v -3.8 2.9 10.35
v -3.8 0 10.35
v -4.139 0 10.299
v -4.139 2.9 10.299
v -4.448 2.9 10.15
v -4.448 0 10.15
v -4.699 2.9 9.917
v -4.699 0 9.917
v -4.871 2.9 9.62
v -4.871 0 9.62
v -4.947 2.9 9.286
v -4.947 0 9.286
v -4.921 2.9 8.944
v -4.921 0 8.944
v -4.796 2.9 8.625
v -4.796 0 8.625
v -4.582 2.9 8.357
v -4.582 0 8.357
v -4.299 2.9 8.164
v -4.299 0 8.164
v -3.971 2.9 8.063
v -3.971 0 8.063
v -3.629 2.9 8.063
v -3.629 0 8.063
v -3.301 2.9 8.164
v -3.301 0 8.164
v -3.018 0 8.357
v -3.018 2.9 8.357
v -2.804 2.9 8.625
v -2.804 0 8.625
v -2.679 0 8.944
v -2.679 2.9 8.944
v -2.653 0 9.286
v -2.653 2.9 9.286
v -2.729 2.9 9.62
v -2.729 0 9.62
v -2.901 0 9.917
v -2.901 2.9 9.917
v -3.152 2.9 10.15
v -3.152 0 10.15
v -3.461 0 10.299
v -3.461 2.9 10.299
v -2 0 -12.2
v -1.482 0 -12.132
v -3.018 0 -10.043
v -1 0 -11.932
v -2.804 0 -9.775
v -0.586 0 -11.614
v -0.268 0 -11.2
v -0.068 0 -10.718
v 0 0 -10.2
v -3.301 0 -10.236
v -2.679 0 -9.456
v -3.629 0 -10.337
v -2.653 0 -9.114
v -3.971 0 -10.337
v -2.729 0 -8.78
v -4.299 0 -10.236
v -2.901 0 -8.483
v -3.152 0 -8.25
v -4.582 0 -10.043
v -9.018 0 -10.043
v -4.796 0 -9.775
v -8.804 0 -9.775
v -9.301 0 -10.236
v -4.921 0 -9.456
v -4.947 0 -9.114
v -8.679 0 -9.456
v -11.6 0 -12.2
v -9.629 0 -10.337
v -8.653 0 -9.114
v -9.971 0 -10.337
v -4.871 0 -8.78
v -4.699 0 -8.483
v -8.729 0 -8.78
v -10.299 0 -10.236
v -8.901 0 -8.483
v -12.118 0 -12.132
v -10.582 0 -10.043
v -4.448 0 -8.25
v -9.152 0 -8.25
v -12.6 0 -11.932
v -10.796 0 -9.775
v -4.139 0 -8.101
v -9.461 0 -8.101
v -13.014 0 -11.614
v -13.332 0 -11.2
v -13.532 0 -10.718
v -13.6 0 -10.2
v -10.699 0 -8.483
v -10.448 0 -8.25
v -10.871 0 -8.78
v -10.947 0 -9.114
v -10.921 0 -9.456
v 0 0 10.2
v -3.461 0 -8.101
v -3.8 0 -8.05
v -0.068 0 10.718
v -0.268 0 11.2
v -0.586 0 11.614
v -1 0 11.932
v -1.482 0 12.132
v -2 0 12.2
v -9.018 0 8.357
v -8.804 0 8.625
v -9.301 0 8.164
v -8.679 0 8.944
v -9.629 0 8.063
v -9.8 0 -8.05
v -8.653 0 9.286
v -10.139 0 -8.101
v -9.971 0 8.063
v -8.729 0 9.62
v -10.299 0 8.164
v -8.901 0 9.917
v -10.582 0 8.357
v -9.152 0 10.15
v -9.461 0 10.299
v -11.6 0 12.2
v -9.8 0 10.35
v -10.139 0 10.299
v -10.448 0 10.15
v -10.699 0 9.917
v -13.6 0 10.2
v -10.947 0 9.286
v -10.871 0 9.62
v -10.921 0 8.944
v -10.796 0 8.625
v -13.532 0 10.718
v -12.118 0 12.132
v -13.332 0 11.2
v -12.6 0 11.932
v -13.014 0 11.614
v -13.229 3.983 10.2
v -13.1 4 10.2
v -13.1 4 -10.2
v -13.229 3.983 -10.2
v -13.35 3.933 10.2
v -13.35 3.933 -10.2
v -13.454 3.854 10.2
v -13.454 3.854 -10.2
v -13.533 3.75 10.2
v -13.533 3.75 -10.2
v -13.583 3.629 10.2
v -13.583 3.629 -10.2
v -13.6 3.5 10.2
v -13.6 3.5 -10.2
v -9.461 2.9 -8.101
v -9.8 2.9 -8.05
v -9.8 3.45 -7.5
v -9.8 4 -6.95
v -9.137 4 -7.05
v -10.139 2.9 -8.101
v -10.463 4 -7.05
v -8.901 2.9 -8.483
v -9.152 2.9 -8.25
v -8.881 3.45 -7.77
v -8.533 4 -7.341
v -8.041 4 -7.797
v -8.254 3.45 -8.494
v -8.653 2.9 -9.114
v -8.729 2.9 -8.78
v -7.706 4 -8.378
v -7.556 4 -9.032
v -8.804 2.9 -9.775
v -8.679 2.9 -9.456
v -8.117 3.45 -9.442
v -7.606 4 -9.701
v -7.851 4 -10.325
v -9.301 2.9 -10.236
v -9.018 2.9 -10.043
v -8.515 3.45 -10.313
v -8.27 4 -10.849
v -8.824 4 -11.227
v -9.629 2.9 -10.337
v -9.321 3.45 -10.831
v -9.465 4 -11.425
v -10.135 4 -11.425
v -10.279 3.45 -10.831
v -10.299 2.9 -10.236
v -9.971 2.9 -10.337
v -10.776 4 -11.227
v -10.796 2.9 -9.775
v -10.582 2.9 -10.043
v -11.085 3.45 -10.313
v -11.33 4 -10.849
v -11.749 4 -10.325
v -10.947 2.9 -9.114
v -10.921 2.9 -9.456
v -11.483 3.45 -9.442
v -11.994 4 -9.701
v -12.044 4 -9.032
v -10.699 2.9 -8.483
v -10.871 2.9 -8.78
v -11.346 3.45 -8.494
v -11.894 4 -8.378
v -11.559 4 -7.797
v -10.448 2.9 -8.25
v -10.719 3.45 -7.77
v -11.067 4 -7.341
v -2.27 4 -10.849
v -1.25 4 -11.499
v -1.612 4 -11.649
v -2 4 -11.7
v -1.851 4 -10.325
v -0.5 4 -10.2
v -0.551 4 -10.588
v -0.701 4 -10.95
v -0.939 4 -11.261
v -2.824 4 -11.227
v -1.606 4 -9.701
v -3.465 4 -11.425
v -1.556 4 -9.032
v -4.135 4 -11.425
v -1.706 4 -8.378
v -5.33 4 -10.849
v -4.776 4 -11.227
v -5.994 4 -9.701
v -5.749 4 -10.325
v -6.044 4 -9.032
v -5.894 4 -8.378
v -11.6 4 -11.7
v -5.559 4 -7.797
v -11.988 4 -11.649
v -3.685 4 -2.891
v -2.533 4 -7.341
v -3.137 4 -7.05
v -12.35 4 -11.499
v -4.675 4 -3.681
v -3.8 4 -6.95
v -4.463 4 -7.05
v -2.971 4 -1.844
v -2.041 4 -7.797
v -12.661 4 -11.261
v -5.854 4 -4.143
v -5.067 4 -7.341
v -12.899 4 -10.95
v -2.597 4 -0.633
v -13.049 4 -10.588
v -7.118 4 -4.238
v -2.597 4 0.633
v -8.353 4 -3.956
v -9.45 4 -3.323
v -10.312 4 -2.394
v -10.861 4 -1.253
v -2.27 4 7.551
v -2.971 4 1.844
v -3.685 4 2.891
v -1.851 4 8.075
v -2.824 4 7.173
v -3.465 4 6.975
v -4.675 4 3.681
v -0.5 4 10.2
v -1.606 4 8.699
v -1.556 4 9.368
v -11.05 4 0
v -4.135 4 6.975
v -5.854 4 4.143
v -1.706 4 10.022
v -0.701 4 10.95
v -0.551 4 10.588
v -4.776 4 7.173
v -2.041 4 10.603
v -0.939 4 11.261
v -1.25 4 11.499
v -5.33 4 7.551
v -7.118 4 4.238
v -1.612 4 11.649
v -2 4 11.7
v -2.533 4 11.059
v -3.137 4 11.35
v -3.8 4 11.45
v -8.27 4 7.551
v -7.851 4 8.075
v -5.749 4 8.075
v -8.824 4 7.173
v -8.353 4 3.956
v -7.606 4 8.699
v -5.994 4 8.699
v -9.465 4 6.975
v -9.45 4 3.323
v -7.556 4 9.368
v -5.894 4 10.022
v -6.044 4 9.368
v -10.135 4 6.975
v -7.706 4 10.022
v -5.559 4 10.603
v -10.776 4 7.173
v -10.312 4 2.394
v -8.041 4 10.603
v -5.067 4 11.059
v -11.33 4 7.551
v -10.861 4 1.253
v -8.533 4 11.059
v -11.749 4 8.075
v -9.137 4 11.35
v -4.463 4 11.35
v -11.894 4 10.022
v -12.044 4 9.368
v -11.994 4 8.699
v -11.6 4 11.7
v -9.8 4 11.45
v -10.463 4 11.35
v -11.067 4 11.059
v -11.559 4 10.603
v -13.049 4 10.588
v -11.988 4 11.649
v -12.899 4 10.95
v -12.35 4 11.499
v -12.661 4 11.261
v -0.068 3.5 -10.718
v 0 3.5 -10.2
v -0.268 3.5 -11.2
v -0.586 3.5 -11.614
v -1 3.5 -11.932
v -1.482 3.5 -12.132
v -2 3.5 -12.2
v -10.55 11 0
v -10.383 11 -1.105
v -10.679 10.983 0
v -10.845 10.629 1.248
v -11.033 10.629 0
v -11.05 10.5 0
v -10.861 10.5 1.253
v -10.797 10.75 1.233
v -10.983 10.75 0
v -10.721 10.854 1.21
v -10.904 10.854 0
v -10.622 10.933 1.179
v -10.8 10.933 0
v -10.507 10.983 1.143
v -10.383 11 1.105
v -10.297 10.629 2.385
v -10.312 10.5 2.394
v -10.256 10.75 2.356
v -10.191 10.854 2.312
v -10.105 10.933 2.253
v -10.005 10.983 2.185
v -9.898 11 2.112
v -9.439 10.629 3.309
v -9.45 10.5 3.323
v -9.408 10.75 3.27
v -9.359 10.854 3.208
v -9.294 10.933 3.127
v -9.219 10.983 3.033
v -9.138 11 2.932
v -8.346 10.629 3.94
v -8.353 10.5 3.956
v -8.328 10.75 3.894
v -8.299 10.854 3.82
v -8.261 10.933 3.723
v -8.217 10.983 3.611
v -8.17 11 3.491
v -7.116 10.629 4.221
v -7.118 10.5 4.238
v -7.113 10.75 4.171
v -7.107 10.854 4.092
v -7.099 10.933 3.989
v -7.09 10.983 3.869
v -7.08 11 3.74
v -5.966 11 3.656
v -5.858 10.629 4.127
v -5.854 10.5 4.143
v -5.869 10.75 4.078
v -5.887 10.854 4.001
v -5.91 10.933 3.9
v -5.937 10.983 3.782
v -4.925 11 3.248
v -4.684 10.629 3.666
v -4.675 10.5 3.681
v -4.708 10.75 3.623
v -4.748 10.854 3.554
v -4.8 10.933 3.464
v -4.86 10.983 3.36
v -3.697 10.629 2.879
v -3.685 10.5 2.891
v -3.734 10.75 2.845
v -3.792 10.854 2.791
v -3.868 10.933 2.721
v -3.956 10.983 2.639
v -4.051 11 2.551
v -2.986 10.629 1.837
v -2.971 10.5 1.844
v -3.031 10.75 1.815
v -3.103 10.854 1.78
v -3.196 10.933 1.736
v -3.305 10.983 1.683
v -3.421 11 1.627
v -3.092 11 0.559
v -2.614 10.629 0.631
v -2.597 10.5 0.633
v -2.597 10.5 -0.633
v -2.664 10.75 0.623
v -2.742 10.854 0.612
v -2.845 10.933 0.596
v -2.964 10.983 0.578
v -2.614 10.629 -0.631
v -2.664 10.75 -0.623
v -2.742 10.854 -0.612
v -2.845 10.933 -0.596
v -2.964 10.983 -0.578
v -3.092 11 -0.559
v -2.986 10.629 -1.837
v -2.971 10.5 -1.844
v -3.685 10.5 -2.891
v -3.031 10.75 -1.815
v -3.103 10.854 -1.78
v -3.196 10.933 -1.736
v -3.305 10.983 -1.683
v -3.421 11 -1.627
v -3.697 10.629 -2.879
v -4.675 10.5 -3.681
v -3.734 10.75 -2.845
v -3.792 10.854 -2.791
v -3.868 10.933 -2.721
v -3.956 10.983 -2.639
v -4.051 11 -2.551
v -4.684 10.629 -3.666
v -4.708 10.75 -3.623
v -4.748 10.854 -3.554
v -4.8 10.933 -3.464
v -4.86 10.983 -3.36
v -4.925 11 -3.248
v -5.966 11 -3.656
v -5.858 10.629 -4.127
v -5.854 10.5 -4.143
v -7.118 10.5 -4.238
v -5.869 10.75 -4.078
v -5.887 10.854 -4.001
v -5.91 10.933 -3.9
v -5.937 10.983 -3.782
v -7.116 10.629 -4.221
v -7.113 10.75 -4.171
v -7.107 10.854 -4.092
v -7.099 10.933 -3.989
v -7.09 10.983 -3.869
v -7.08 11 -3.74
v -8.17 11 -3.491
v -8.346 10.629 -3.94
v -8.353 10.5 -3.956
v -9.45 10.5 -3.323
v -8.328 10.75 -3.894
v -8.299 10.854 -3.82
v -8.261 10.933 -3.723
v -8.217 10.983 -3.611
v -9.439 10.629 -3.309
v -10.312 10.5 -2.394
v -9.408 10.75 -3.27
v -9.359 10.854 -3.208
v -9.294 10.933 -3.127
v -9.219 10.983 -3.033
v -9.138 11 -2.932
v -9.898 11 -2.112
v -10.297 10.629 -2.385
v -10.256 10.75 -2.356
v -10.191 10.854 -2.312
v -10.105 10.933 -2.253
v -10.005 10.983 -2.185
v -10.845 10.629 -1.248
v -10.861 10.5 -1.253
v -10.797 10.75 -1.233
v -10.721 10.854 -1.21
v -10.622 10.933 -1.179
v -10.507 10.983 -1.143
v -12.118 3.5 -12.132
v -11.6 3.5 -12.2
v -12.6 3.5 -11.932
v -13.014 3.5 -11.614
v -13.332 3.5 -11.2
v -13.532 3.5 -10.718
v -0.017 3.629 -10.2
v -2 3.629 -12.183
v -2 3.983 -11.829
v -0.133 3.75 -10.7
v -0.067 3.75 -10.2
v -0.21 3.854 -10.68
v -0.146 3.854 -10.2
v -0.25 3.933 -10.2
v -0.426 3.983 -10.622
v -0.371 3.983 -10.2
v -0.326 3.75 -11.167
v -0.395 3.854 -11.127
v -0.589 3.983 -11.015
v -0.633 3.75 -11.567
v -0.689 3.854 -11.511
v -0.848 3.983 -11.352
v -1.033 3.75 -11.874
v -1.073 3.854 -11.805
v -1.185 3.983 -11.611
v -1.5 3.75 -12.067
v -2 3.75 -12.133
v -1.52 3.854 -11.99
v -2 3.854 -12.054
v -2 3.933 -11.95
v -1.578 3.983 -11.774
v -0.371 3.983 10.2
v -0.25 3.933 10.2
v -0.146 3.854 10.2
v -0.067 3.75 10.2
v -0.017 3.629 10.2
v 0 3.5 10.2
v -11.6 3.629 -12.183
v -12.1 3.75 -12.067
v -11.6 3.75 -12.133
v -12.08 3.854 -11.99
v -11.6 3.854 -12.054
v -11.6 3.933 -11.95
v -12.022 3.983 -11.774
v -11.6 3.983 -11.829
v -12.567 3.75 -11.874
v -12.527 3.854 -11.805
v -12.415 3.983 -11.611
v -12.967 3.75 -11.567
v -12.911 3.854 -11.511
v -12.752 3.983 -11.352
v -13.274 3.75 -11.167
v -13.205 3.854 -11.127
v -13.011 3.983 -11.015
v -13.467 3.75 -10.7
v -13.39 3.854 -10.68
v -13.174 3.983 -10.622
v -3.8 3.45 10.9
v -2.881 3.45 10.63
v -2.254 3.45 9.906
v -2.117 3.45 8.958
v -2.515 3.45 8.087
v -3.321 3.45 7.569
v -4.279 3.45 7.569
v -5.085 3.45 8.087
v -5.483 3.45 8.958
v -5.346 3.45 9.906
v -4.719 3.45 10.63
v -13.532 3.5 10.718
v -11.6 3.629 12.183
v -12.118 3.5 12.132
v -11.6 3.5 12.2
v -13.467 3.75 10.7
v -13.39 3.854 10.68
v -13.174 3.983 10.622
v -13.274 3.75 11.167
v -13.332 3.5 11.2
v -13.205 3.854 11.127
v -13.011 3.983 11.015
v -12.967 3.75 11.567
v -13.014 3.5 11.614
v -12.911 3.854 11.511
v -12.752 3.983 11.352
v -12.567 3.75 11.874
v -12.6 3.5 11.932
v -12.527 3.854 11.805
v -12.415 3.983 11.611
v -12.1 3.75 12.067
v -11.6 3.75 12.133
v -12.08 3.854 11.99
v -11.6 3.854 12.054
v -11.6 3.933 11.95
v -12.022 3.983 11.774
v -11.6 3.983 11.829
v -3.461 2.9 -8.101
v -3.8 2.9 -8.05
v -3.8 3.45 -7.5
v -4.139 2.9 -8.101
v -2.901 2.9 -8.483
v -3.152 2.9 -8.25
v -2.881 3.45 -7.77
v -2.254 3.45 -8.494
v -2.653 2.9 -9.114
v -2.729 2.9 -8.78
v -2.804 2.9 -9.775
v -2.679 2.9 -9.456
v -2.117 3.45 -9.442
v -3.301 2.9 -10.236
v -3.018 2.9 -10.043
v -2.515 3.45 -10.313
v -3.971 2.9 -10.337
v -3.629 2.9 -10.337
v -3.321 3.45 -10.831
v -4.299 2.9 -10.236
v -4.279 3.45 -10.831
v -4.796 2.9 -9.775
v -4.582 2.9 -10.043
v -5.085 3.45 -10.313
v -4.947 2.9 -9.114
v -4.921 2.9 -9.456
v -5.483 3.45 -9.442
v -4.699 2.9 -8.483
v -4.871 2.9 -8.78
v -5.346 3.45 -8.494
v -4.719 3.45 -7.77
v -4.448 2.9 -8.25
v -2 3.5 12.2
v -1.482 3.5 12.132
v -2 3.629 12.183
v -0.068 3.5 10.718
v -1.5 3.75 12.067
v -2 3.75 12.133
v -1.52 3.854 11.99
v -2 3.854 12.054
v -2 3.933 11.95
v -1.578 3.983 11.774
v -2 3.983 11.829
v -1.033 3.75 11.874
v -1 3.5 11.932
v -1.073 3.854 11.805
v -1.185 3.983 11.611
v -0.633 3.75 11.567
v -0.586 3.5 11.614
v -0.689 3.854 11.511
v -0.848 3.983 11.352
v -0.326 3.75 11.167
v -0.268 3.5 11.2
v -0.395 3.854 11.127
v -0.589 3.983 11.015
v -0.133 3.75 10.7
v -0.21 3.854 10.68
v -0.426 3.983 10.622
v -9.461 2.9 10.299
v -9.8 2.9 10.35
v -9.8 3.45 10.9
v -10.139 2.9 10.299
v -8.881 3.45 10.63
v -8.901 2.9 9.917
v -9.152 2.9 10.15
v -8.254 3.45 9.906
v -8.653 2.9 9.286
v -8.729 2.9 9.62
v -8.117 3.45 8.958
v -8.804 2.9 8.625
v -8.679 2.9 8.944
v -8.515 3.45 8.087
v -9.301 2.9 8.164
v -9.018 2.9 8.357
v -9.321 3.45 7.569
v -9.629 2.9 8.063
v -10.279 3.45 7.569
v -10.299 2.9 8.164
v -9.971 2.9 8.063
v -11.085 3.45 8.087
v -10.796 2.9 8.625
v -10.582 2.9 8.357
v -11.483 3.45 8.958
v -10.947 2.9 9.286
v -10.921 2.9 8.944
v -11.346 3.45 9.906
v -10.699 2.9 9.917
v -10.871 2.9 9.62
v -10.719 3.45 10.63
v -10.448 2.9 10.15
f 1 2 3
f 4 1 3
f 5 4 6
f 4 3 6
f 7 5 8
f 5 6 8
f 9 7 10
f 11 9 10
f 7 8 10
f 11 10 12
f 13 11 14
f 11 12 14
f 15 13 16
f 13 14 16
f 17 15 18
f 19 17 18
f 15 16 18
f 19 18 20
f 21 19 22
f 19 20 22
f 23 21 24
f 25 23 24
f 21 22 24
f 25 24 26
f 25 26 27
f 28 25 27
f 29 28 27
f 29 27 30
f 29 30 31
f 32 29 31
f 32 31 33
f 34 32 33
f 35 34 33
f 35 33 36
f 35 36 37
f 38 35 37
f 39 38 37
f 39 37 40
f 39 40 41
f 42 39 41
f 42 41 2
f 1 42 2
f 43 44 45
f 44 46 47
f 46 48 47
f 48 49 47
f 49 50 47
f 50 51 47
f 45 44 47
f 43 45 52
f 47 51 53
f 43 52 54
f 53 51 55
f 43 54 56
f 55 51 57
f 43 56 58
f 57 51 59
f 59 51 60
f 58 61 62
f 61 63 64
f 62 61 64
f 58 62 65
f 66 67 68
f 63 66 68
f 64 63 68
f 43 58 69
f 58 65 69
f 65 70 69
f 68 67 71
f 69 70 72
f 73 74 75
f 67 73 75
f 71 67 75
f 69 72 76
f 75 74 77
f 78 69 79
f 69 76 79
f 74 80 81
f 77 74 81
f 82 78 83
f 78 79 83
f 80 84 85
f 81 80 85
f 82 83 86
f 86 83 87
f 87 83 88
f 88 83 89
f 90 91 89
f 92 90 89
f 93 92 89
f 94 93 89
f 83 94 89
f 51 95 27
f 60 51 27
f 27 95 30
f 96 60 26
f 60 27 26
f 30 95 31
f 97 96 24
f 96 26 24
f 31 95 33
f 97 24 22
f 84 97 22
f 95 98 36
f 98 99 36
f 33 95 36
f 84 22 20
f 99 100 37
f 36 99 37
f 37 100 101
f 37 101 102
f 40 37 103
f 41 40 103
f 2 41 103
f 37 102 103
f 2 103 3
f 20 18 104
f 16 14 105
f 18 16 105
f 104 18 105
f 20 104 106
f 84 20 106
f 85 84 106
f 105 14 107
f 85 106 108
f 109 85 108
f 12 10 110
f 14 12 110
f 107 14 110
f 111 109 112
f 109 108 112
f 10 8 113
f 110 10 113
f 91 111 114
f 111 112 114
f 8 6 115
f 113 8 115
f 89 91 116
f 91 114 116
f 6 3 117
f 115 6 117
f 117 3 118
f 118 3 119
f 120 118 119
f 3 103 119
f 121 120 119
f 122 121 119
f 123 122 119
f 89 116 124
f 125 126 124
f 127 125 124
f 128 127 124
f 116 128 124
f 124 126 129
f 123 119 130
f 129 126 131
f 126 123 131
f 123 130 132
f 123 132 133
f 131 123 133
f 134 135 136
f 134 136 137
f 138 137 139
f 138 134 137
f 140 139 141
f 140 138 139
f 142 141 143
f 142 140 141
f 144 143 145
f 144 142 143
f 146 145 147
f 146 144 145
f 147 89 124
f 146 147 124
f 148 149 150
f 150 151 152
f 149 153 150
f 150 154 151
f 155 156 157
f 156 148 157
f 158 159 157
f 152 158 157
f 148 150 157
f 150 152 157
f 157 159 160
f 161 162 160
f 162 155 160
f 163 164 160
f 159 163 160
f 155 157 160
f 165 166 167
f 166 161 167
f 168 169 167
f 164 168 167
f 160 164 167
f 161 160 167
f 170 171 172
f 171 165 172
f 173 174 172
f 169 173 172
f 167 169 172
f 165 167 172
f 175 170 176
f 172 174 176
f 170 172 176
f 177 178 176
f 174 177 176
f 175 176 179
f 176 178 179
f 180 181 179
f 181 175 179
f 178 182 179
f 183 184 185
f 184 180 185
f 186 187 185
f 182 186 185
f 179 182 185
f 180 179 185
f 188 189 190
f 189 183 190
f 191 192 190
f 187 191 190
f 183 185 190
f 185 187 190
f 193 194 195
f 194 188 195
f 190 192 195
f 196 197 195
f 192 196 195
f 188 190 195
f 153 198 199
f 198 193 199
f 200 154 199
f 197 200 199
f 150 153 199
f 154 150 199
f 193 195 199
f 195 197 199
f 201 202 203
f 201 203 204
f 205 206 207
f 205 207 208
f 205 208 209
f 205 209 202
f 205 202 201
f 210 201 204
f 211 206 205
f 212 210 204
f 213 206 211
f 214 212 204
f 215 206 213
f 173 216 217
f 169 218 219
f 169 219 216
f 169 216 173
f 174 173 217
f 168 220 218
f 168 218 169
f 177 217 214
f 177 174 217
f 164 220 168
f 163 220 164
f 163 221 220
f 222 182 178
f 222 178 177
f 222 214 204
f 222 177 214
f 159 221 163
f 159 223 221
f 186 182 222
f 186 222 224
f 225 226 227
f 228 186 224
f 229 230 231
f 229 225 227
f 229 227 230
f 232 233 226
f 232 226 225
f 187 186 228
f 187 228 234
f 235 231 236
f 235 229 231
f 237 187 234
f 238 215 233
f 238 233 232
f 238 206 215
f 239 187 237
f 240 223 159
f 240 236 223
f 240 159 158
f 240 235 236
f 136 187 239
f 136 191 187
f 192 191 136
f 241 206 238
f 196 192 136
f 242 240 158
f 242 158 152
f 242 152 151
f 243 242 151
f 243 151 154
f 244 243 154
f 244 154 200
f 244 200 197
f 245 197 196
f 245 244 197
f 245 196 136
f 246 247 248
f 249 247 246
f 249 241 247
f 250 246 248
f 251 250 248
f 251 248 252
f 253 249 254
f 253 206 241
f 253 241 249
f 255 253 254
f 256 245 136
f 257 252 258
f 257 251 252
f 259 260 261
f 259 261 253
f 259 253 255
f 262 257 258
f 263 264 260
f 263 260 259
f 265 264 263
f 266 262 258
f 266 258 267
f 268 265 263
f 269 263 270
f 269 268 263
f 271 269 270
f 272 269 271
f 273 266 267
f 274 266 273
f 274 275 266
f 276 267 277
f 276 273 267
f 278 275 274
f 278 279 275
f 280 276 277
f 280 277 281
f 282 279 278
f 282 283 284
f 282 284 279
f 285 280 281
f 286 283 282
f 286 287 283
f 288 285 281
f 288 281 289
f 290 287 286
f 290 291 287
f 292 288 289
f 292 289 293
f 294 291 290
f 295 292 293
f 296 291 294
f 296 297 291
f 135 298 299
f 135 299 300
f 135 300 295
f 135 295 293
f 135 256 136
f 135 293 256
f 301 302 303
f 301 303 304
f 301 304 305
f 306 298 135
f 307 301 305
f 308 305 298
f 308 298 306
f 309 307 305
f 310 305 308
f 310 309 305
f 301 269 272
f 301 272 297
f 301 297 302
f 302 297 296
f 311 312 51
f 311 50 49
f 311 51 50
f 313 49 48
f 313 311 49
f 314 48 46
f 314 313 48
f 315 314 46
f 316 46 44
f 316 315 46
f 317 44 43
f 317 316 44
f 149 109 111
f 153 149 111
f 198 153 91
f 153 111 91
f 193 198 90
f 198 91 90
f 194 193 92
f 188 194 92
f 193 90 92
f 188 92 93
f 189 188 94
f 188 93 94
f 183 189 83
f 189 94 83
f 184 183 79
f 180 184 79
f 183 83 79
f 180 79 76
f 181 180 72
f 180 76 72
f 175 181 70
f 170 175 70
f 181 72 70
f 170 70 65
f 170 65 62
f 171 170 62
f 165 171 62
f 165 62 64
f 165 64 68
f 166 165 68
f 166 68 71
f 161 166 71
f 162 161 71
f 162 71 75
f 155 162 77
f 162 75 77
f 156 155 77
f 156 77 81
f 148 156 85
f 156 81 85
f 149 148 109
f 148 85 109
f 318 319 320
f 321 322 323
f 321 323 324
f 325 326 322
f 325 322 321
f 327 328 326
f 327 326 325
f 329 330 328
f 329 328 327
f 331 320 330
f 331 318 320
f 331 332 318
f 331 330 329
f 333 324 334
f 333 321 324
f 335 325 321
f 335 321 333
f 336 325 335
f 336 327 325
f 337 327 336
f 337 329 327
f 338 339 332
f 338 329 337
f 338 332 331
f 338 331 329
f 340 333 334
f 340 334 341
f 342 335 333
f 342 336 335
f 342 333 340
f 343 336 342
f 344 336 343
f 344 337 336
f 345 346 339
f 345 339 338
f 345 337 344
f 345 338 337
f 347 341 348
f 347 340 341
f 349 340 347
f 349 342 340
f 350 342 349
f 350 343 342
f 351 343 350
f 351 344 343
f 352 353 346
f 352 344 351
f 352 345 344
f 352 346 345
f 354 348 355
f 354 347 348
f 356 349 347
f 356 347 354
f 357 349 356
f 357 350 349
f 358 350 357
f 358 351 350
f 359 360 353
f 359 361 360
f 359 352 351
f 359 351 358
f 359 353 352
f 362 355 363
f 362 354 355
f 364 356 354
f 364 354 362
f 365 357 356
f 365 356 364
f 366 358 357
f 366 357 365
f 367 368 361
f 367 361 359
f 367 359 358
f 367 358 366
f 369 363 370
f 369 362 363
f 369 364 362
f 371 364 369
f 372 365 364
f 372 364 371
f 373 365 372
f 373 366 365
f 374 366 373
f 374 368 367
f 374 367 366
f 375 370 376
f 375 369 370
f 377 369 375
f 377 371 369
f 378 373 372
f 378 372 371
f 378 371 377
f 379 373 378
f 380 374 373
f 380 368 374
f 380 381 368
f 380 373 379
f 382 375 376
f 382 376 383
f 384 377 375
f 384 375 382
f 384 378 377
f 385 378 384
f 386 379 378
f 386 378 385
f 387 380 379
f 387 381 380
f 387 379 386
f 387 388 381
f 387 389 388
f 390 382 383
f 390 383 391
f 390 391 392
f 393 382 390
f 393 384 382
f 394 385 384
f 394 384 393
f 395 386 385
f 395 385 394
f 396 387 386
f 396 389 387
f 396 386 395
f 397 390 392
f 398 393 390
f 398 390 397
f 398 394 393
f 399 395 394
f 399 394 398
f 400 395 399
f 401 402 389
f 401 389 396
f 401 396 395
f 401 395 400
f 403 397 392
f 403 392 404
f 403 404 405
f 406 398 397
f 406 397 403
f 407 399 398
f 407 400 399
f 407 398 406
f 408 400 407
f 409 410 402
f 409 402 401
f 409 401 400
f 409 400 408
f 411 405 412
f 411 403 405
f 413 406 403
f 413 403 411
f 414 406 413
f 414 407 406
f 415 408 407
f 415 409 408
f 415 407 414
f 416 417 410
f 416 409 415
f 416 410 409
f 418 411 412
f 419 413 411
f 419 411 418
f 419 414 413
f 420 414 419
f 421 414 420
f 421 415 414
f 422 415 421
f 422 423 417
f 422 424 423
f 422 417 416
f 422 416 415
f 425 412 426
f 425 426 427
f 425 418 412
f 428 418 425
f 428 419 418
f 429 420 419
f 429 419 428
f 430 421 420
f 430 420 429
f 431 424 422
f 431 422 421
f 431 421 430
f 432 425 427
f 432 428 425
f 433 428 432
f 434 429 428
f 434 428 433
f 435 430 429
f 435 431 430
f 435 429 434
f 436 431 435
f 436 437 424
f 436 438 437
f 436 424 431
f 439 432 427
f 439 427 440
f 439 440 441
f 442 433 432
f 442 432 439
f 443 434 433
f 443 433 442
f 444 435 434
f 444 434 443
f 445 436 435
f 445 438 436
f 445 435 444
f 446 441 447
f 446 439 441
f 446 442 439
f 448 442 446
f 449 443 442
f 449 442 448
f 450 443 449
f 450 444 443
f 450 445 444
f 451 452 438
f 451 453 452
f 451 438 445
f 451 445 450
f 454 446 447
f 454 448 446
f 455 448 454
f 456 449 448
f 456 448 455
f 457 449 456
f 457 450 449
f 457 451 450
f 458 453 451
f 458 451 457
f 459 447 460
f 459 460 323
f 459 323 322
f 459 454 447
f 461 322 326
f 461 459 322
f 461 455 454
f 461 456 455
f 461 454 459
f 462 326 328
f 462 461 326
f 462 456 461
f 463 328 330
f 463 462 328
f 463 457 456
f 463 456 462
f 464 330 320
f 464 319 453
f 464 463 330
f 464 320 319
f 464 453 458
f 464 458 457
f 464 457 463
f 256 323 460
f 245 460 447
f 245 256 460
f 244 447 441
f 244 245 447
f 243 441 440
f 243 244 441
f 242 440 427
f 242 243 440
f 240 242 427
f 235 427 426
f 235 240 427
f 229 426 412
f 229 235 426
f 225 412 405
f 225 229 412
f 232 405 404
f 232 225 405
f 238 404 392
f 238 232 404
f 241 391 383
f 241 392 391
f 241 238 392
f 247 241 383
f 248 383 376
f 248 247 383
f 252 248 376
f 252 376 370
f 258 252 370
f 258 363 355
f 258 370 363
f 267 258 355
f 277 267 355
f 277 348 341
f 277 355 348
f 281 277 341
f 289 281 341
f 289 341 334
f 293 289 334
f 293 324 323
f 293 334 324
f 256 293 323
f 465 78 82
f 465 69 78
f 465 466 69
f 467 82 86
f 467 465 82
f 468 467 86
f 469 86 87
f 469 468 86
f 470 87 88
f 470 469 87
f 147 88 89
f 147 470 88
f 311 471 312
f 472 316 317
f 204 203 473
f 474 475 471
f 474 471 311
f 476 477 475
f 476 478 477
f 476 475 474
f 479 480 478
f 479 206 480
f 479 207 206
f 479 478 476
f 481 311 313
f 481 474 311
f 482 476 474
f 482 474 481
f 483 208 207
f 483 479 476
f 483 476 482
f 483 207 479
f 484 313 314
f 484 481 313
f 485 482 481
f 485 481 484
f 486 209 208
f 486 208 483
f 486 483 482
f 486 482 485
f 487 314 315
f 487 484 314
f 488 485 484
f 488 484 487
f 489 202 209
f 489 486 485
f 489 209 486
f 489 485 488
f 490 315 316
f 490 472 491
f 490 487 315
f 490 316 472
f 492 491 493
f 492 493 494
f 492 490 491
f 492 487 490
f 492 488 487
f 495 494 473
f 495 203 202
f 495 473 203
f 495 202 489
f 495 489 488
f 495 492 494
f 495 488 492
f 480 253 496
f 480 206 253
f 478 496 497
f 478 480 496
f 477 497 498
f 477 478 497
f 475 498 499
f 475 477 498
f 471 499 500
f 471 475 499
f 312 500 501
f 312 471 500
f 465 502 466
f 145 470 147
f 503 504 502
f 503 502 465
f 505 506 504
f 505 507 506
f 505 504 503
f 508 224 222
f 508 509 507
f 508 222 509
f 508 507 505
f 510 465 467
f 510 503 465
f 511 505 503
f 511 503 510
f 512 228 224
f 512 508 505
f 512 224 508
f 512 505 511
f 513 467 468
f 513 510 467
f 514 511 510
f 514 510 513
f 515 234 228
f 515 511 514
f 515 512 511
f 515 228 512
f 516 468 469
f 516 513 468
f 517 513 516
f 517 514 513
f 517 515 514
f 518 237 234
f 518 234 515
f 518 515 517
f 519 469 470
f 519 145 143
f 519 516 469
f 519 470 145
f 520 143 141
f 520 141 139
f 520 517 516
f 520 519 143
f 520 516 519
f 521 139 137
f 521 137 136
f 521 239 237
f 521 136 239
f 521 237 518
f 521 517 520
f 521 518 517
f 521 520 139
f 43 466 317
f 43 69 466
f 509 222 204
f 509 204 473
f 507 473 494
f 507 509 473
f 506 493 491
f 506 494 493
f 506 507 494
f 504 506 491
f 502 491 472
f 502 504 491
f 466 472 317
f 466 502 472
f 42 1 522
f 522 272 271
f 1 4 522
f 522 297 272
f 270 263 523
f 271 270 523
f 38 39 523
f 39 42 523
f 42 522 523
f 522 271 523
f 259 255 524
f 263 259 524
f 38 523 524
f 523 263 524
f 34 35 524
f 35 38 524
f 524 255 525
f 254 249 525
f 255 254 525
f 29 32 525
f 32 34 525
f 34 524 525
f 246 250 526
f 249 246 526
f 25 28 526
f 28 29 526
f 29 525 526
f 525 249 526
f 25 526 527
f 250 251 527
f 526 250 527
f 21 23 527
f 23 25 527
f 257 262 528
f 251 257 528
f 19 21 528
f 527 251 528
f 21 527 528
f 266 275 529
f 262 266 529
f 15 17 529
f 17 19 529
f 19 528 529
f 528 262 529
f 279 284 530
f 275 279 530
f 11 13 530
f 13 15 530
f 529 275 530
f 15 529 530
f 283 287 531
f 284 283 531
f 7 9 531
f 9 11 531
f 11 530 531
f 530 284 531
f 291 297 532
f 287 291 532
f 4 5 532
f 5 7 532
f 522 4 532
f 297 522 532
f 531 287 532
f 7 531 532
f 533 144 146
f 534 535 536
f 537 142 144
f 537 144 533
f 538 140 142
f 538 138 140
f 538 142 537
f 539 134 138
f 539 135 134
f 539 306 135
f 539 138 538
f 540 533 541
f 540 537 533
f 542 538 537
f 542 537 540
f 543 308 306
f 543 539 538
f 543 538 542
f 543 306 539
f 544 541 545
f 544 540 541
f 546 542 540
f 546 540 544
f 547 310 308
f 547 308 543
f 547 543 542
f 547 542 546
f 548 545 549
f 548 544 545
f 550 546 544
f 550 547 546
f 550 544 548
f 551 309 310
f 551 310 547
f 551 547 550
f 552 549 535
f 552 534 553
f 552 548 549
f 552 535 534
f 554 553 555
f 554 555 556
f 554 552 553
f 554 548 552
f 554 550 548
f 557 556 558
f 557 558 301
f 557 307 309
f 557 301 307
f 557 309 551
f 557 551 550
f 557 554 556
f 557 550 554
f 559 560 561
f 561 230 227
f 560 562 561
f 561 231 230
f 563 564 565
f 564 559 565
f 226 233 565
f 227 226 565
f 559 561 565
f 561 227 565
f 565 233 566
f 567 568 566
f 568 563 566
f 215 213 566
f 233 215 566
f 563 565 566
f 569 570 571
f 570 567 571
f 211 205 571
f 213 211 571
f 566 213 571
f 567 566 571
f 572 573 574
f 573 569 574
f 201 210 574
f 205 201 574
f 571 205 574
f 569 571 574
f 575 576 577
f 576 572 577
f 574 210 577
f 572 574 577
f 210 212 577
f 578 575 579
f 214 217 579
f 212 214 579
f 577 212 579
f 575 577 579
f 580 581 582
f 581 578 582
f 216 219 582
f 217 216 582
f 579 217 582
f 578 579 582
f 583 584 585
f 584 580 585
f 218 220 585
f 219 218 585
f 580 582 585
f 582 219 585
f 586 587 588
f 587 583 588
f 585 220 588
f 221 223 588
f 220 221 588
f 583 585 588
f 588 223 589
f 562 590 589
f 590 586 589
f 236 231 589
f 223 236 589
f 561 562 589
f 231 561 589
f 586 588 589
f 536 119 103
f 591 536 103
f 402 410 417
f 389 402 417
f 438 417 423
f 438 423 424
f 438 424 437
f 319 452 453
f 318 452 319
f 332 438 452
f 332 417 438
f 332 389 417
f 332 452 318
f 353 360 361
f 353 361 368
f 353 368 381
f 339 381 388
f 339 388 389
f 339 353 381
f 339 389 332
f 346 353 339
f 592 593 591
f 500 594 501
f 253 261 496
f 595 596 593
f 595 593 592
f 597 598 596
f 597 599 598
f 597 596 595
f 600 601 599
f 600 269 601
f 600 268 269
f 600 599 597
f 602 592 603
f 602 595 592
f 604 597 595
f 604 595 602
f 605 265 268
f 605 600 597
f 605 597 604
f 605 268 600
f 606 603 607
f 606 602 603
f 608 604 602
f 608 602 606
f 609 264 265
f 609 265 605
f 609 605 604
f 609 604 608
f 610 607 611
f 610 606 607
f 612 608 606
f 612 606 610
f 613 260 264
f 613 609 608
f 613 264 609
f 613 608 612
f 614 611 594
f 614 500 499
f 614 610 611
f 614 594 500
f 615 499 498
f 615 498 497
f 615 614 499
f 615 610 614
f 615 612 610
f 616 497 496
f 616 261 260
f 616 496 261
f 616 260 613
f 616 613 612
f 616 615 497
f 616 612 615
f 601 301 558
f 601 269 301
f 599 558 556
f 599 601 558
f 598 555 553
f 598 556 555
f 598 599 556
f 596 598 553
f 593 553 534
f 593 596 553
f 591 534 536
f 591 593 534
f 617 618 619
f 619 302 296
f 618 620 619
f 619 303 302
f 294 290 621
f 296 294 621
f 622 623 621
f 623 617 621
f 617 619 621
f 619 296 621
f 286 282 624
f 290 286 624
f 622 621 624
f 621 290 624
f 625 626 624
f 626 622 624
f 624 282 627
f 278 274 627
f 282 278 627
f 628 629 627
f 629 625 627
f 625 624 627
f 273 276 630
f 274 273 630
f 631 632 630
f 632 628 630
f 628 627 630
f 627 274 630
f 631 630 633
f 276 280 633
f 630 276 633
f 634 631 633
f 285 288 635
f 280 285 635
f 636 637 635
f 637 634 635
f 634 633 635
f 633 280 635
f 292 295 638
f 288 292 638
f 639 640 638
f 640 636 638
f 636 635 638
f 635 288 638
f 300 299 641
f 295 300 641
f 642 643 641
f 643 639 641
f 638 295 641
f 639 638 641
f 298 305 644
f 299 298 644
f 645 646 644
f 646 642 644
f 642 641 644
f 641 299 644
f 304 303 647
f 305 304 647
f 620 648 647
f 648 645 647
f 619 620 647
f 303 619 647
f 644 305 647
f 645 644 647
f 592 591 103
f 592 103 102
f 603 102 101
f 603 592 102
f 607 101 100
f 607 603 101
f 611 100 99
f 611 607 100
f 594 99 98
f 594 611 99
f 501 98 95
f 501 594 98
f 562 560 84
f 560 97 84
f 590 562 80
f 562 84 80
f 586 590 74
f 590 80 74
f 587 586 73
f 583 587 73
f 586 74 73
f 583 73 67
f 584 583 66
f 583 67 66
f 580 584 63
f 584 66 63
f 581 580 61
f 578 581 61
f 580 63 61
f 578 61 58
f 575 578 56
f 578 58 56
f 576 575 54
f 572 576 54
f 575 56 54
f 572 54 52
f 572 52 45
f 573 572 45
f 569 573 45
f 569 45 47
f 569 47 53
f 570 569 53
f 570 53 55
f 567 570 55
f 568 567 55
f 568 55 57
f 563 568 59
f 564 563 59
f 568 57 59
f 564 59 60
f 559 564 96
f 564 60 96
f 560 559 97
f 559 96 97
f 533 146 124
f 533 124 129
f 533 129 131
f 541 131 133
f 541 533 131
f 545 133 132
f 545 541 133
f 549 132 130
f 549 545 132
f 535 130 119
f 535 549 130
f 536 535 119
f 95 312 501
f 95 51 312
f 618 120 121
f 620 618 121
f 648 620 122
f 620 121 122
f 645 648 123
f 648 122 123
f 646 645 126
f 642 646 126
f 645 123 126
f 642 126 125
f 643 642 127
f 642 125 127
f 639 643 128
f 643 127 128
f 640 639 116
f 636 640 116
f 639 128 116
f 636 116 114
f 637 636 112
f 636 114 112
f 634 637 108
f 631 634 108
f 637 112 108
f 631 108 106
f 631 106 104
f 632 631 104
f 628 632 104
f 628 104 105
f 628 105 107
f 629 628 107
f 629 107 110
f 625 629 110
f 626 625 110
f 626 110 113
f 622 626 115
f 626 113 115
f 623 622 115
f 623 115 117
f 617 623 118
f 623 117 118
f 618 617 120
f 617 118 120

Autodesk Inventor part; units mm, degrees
ref_plane "YZ Plane" through (0, 0, 0) normal (1, 0, 0) x (0, 1, 0)
ref_plane "XZ Plane" through (0, 0, 0) normal (0, 1, 0) x (-1, 0, 0)
ref_plane "XY Plane" through (0, 0, 0) normal (0, 0, 1) x (1, 0, 0)
sketch "Sketch1" plane through (0, 0, 0) normal (0, 1, 0) x (-1, 0, 0)
  line L0 (0, -21.955) -> (0, -12.2) construction
  line L1 (13.6, -21.955) -> (13.6, -12.2) construction
  line L2 (-11, -20.9069) -> (-11, 21.1673) construction
  line L3 (16.0254, 0) -> (-21.0399, 0) construction
  line L4 (13.6, -6.2) -> (0, -6.2)
  line L5 (13.6, 6.2) -> (0, 6.2)
  line L6 (6.8, -14.862) -> (6.8, 12.9569) construction
  line L7 (13.6, -6.2) -> (13.6, 6.2)
  line L8 (13.6, 6.2) -> (13.6, 12.2)
  line L9 (0, -6.2) -> (0, 6.2)
  line L10 (0, 6.2) -> (0, 12.2)
  line L11 (13.6, -12.2) -> (0, -12.2)
  line L12 (13.6, 12.2) -> (0, 12.2)
  line L13 (13.6, -12.2) -> (13.6, -6.2)
  line L14 (0, -12.2) -> (0, -6.2)
  line L15 (13.6, 12.2) -> (13.6, 20.1192) construction
  line L16 (0, 12.2) -> (0, 20.7166) construction
  line L17 (9.8, -9.2) -> (3.8, -9.2) construction
  line L18 (3.8, -9.2) -> (3.8, 9.2) construction
  line L19 (3.8, 9.2) -> (9.8, 9.2) construction
  line L20 (9.8, 9.2) -> (9.8, -9.2) construction
  circle A0 centre (6.8, 0) radius 4.25
  point P0 (0, 0)
  dimension "d0" = 24.6
  dimension "d1" = 12.4
  dimension "d2" = 6
  dimension "d4" = 6
  dimension "d17" = 8.5
  dimension "d21" = 6.8
extrude "Extrusion1" add sketch "Sketch1" along normal blind 4 contours L13 L11 L14 L4 | L5 L10 L12 L8
extrude "Extrusion2" add sketch "Sketch1" along normal blind 4 contours L4 L9 L5 L7 | A0
fillet "Fillet1" radius 2 4 edges at (0, 2, 12.2) (-13.6, 2, 12.2) (-13.6, 2, -12.2) (0, 2, -12.2)
extrude "Extrusion3" add sketch "Sketch1" along normal blind 11 contours A0
fillet "Fillet2" radius 0.5 9 edges at (-2.55, 11, 0) (0, 4, 0) (-13.6, 4, 0) (-0.5858, 4, -11.6142) (-6.8, 4, -12.2) (-13.0142, 4, -11.6142) (-0.5858, 4, 11.6142) (-6.8, 4, 12.2) (-13.0142, 4, 11.6142)
sketch "Sketch3" plane through (0, 4, 0) normal (0, 1, 0) x (1, 0, 0)
  point P0 (0, 0)
  point P1 (-9.8, -9.2)
  point P2 (-3.8, -9.2)
  point P3 (-9.8, 9.2)
  point P4 (-3.8, 9.2)
hole "Hole2" at (-9.8, 4, 9.2) at (-3.8, 4, 9.2) at (-9.8, 4, -9.2) at (-3.8, 4, -9.2) direction (0, -1, 0) diameter 2.3 depth 6.5 countersink diameter 4.5 countersink angle 90
properties part number "LegPin_v1"
